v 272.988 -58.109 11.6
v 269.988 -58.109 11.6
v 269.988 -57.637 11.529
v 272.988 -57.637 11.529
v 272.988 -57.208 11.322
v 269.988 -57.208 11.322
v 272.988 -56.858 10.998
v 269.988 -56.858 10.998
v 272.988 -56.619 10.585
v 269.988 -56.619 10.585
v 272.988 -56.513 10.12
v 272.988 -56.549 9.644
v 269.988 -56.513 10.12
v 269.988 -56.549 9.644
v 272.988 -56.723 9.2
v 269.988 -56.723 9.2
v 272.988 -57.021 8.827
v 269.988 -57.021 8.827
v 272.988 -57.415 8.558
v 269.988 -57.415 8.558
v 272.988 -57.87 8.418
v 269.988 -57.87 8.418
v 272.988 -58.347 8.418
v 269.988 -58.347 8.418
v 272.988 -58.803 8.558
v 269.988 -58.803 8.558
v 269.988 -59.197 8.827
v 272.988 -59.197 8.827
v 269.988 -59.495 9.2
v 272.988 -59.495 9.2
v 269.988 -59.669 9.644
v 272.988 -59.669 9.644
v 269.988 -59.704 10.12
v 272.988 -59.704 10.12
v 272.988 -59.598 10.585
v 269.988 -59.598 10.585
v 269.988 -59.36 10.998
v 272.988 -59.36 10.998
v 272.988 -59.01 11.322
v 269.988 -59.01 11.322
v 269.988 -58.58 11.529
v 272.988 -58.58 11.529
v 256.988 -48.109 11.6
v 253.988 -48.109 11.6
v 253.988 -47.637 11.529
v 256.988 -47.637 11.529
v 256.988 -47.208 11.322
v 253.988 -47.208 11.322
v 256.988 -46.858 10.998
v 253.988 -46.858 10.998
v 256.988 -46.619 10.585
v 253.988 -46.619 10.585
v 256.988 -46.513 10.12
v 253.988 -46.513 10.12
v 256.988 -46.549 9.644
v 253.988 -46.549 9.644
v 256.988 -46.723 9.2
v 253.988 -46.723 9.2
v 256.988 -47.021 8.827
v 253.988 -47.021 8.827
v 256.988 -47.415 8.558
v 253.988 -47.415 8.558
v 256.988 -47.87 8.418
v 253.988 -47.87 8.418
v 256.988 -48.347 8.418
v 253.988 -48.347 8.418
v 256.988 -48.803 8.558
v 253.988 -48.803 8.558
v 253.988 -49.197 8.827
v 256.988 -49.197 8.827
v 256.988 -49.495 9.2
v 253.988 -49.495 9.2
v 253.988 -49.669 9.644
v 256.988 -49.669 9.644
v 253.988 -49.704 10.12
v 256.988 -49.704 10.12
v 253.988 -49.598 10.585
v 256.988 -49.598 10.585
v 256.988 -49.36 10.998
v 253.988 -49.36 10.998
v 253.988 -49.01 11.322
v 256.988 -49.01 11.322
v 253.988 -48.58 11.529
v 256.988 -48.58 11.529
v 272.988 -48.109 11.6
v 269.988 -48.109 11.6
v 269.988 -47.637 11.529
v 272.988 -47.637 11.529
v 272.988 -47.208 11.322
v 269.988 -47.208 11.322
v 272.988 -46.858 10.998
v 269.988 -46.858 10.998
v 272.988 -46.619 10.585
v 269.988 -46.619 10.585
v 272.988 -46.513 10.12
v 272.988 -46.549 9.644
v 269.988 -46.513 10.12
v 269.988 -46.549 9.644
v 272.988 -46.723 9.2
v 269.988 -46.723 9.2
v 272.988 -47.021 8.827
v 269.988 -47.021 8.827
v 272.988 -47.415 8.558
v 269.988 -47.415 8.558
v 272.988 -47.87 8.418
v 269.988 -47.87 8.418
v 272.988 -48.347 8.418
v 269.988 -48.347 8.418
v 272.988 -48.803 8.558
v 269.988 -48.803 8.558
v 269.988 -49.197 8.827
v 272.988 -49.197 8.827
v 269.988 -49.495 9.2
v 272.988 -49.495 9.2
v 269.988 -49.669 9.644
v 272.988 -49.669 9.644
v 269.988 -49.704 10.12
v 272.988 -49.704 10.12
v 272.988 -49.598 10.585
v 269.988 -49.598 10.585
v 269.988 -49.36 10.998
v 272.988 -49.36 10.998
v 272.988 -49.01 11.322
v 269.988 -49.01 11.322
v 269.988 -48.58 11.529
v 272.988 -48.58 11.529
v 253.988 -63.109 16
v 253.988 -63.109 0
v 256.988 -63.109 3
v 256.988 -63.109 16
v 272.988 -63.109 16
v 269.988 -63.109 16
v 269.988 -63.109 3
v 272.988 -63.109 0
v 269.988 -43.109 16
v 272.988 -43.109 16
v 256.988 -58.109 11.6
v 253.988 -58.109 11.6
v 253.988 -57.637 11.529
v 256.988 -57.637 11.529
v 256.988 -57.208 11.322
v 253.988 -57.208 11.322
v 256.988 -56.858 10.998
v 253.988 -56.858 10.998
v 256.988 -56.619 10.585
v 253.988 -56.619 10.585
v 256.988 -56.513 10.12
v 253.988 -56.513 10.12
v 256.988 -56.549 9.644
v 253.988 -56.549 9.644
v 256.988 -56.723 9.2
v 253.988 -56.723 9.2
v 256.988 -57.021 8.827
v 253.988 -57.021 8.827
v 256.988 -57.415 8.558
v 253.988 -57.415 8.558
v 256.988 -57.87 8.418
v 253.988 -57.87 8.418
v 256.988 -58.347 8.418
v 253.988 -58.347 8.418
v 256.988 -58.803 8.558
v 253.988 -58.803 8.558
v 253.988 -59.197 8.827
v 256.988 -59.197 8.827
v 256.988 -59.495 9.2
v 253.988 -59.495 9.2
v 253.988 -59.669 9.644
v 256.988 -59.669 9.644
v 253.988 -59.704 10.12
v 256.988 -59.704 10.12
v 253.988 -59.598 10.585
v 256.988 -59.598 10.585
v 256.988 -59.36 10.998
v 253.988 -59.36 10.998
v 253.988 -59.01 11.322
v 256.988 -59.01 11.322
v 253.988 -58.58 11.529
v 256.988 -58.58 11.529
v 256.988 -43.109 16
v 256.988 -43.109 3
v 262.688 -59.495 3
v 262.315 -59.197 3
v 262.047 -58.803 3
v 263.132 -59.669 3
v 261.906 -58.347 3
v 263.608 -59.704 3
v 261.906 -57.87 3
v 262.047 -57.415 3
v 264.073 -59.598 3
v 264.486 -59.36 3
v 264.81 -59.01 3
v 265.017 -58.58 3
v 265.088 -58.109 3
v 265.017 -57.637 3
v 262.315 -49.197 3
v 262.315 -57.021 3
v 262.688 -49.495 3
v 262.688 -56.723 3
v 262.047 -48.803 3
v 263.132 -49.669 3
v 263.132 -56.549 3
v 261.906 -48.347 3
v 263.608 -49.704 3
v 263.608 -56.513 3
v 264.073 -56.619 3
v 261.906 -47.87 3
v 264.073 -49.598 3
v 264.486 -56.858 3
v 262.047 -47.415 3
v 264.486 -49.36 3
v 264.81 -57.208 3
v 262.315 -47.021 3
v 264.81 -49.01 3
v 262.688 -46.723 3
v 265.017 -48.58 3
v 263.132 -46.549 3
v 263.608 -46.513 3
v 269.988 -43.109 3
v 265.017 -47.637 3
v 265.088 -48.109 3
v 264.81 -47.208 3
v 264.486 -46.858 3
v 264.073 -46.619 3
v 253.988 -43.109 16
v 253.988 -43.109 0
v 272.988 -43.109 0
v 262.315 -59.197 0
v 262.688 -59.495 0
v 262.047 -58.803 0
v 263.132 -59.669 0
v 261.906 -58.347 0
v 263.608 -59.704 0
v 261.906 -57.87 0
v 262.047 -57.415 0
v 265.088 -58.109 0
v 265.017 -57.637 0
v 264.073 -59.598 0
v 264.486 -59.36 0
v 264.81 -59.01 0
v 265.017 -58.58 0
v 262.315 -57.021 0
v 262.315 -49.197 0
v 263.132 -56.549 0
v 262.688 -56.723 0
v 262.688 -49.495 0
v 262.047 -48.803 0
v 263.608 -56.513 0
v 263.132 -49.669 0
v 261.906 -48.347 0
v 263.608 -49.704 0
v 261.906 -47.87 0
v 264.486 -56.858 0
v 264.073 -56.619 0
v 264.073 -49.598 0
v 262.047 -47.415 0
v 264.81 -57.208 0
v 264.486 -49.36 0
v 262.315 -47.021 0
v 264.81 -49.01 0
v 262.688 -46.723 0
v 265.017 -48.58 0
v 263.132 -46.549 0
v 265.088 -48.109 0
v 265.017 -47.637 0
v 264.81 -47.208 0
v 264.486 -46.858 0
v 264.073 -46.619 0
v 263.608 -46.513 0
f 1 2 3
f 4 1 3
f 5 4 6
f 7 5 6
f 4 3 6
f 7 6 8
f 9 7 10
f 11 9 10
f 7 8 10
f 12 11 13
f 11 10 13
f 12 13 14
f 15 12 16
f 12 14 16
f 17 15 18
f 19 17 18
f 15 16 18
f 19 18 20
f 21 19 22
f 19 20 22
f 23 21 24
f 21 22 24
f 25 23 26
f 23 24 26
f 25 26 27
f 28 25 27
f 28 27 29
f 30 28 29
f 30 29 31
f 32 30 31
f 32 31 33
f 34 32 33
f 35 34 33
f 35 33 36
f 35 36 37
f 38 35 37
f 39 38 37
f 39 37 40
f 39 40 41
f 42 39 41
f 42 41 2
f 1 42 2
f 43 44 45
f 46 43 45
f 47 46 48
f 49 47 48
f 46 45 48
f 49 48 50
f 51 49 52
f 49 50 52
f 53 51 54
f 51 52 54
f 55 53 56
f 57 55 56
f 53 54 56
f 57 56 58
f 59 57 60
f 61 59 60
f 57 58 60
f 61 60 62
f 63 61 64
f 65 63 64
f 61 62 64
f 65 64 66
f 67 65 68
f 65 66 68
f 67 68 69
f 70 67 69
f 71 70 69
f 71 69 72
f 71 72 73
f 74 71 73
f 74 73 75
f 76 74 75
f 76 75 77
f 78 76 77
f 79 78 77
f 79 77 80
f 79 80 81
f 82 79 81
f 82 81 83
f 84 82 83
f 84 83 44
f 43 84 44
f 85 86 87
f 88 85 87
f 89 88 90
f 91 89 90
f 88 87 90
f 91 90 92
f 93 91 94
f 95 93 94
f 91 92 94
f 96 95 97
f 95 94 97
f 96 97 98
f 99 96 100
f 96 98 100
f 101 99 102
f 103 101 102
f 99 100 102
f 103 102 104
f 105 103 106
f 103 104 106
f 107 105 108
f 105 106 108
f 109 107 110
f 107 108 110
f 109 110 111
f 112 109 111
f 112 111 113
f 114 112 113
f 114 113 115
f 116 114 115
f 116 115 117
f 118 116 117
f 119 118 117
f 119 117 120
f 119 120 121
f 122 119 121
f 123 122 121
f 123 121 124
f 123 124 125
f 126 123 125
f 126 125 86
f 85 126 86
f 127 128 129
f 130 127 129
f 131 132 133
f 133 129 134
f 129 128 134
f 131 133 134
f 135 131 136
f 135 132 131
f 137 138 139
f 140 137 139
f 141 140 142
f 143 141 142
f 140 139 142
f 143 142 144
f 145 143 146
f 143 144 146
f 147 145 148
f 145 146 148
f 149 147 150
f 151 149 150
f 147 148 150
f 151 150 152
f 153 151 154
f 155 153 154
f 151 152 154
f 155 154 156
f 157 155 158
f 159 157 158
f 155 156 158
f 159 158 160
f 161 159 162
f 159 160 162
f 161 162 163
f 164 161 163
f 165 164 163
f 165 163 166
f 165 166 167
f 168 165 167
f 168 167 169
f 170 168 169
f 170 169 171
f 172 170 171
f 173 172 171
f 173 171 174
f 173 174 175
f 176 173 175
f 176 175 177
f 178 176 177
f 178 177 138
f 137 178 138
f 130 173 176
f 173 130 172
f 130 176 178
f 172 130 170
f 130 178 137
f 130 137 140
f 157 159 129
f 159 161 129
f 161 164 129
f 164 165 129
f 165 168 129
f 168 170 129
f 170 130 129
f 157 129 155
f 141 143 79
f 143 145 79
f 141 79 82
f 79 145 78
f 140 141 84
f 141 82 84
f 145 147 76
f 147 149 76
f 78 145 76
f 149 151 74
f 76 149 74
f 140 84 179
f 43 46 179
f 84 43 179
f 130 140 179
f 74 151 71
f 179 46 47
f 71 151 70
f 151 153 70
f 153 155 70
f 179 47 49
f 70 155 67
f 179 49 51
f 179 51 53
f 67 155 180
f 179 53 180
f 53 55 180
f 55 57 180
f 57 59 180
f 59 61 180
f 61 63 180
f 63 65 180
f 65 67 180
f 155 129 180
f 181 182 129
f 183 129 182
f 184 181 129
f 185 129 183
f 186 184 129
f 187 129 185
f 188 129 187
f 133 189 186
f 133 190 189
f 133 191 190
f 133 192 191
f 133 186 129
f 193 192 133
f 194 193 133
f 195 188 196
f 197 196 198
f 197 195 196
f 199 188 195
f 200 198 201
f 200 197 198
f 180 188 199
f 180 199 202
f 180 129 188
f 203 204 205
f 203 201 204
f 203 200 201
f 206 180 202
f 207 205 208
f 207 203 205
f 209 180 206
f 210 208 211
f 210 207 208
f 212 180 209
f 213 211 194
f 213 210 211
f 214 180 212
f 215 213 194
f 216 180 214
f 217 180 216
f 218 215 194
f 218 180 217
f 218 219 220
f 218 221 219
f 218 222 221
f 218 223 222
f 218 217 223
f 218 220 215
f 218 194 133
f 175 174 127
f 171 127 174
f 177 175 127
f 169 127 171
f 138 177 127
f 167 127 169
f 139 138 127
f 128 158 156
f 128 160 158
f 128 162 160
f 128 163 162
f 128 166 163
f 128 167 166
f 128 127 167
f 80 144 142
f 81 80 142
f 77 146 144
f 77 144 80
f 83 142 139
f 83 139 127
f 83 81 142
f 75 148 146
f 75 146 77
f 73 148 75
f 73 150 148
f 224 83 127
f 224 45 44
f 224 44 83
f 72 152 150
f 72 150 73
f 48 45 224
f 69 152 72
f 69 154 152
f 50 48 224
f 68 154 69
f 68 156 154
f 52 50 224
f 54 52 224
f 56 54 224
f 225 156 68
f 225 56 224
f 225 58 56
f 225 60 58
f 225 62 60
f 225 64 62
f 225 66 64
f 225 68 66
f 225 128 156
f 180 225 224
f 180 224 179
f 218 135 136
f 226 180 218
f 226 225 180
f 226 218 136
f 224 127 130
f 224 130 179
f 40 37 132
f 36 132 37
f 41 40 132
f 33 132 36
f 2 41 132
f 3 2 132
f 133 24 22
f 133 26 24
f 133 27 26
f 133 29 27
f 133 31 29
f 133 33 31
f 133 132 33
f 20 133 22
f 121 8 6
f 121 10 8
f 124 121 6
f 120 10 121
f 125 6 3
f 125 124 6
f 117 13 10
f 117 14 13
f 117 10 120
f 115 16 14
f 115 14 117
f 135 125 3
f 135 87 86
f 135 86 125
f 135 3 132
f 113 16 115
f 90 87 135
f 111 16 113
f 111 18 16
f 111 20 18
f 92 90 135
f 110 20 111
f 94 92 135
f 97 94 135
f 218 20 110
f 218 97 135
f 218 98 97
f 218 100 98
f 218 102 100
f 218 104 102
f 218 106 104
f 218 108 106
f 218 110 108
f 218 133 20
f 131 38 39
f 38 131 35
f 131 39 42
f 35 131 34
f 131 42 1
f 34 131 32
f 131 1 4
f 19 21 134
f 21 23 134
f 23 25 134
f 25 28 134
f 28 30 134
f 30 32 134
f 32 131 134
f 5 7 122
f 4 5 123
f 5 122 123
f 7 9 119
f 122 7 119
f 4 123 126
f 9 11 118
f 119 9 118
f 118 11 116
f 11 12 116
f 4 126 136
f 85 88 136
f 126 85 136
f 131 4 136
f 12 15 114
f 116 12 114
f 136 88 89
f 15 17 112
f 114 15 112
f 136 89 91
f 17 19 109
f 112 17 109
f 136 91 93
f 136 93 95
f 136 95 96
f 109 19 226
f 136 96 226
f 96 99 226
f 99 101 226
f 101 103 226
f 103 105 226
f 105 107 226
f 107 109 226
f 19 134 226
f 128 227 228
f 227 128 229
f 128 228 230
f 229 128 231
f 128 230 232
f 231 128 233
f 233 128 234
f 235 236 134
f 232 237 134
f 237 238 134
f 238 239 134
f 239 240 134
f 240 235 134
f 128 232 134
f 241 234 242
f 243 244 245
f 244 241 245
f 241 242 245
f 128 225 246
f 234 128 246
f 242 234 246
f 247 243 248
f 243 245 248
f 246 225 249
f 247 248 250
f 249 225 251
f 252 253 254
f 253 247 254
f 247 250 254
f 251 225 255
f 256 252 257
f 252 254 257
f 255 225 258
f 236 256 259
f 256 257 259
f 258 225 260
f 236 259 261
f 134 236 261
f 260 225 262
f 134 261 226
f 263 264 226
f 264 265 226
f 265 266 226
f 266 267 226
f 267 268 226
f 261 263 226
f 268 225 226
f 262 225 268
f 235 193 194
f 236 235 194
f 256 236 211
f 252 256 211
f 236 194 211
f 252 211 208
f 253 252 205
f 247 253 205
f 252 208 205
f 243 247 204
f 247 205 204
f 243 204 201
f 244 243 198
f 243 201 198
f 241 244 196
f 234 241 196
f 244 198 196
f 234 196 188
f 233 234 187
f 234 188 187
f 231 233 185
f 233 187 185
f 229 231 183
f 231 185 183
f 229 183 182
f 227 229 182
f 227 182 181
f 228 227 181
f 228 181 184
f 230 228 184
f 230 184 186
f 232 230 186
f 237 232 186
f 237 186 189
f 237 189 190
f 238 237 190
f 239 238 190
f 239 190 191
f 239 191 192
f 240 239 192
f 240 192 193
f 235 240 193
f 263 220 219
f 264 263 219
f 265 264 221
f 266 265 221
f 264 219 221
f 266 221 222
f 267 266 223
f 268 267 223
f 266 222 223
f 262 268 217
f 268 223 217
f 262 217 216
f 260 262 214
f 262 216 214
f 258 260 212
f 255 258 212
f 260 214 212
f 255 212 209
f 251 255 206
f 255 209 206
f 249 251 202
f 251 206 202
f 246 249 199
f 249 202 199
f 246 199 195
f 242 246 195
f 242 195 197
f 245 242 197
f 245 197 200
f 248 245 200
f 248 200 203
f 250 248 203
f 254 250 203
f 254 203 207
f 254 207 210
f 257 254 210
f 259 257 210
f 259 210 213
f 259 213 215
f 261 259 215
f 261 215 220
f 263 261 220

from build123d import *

# Parameters (mm, degrees)
SKETCH_1_W          = 19
SKETCH_1_H          = 20
EXTRUDE_1_DEPTH     = 3
SKETCH_2_W          = 3
SKETCH_2_H          = 20
EXTRUDE_2_DEPTH     = 15
SKETCH_3_R          = 1.6
CUT_EXTRUDE_1_DEPTH = 30
SKETCH_4_R          = 1.6
CUT_EXTRUDE_2_DEPTH = 30
SKETCH_5_W          = 9.97361981
SKETCH_5_H          = 25.467578512
CUT_EXTRUDE_3_DEPTH = 29


with BuildPart() as part:
    # 草图1 → 凸台-拉伸1 (new body)
    with BuildSketch(Plane.XY):
        with Locations((263.488347113, -53.108866795)):
            Rectangle(SKETCH_1_W, SKETCH_1_H)
    extrude(amount=EXTRUDE_1_DEPTH)

    # 草图2 → 凸台-拉伸2 (add)
    with BuildSketch(Plane.XY.offset(3)):
        with Locations((255.488347113, -53.108866795)):
            Rectangle(SKETCH_2_W, SKETCH_2_H)
        with Locations((271.488347113, -53.108866795)):
            Rectangle(SKETCH_2_W, SKETCH_2_H)
    extrude(amount=EXTRUDE_2_DEPTH)

    # 草图3 → 切除-拉伸1 (cut)
    with BuildSketch(Plane.ZY.offset(-253.988347113)):
        with Locations((10, -48.108866795)):
            Circle(SKETCH_3_R)
        with Locations((10, -58.108866795)):
            Circle(SKETCH_3_R)
    extrude(amount=-CUT_EXTRUDE_1_DEPTH, mode=Mode.SUBTRACT)

    # 草图4 → 切除-拉伸2 (cut)
    with BuildSketch(Plane.XY.offset(3)):
        with Locations((263.488347113, -48.108866795)):
            Circle(SKETCH_4_R)
        with Locations((263.488347113, -58.108866795)):
            Circle(SKETCH_4_R)
    extrude(amount=-CUT_EXTRUDE_2_DEPTH, mode=Mode.SUBTRACT)

    # 草图5 → 切除-拉伸3 (cut)
    with BuildSketch(Plane.ZY.offset(-253.988347113)):
        with Locations((20.986809905, -55.842656051)):
            Rectangle(SKETCH_5_W, SKETCH_5_H)
    extrude(amount=-CUT_EXTRUDE_3_DEPTH, mode=Mode.SUBTRACT)


solid = part.part
